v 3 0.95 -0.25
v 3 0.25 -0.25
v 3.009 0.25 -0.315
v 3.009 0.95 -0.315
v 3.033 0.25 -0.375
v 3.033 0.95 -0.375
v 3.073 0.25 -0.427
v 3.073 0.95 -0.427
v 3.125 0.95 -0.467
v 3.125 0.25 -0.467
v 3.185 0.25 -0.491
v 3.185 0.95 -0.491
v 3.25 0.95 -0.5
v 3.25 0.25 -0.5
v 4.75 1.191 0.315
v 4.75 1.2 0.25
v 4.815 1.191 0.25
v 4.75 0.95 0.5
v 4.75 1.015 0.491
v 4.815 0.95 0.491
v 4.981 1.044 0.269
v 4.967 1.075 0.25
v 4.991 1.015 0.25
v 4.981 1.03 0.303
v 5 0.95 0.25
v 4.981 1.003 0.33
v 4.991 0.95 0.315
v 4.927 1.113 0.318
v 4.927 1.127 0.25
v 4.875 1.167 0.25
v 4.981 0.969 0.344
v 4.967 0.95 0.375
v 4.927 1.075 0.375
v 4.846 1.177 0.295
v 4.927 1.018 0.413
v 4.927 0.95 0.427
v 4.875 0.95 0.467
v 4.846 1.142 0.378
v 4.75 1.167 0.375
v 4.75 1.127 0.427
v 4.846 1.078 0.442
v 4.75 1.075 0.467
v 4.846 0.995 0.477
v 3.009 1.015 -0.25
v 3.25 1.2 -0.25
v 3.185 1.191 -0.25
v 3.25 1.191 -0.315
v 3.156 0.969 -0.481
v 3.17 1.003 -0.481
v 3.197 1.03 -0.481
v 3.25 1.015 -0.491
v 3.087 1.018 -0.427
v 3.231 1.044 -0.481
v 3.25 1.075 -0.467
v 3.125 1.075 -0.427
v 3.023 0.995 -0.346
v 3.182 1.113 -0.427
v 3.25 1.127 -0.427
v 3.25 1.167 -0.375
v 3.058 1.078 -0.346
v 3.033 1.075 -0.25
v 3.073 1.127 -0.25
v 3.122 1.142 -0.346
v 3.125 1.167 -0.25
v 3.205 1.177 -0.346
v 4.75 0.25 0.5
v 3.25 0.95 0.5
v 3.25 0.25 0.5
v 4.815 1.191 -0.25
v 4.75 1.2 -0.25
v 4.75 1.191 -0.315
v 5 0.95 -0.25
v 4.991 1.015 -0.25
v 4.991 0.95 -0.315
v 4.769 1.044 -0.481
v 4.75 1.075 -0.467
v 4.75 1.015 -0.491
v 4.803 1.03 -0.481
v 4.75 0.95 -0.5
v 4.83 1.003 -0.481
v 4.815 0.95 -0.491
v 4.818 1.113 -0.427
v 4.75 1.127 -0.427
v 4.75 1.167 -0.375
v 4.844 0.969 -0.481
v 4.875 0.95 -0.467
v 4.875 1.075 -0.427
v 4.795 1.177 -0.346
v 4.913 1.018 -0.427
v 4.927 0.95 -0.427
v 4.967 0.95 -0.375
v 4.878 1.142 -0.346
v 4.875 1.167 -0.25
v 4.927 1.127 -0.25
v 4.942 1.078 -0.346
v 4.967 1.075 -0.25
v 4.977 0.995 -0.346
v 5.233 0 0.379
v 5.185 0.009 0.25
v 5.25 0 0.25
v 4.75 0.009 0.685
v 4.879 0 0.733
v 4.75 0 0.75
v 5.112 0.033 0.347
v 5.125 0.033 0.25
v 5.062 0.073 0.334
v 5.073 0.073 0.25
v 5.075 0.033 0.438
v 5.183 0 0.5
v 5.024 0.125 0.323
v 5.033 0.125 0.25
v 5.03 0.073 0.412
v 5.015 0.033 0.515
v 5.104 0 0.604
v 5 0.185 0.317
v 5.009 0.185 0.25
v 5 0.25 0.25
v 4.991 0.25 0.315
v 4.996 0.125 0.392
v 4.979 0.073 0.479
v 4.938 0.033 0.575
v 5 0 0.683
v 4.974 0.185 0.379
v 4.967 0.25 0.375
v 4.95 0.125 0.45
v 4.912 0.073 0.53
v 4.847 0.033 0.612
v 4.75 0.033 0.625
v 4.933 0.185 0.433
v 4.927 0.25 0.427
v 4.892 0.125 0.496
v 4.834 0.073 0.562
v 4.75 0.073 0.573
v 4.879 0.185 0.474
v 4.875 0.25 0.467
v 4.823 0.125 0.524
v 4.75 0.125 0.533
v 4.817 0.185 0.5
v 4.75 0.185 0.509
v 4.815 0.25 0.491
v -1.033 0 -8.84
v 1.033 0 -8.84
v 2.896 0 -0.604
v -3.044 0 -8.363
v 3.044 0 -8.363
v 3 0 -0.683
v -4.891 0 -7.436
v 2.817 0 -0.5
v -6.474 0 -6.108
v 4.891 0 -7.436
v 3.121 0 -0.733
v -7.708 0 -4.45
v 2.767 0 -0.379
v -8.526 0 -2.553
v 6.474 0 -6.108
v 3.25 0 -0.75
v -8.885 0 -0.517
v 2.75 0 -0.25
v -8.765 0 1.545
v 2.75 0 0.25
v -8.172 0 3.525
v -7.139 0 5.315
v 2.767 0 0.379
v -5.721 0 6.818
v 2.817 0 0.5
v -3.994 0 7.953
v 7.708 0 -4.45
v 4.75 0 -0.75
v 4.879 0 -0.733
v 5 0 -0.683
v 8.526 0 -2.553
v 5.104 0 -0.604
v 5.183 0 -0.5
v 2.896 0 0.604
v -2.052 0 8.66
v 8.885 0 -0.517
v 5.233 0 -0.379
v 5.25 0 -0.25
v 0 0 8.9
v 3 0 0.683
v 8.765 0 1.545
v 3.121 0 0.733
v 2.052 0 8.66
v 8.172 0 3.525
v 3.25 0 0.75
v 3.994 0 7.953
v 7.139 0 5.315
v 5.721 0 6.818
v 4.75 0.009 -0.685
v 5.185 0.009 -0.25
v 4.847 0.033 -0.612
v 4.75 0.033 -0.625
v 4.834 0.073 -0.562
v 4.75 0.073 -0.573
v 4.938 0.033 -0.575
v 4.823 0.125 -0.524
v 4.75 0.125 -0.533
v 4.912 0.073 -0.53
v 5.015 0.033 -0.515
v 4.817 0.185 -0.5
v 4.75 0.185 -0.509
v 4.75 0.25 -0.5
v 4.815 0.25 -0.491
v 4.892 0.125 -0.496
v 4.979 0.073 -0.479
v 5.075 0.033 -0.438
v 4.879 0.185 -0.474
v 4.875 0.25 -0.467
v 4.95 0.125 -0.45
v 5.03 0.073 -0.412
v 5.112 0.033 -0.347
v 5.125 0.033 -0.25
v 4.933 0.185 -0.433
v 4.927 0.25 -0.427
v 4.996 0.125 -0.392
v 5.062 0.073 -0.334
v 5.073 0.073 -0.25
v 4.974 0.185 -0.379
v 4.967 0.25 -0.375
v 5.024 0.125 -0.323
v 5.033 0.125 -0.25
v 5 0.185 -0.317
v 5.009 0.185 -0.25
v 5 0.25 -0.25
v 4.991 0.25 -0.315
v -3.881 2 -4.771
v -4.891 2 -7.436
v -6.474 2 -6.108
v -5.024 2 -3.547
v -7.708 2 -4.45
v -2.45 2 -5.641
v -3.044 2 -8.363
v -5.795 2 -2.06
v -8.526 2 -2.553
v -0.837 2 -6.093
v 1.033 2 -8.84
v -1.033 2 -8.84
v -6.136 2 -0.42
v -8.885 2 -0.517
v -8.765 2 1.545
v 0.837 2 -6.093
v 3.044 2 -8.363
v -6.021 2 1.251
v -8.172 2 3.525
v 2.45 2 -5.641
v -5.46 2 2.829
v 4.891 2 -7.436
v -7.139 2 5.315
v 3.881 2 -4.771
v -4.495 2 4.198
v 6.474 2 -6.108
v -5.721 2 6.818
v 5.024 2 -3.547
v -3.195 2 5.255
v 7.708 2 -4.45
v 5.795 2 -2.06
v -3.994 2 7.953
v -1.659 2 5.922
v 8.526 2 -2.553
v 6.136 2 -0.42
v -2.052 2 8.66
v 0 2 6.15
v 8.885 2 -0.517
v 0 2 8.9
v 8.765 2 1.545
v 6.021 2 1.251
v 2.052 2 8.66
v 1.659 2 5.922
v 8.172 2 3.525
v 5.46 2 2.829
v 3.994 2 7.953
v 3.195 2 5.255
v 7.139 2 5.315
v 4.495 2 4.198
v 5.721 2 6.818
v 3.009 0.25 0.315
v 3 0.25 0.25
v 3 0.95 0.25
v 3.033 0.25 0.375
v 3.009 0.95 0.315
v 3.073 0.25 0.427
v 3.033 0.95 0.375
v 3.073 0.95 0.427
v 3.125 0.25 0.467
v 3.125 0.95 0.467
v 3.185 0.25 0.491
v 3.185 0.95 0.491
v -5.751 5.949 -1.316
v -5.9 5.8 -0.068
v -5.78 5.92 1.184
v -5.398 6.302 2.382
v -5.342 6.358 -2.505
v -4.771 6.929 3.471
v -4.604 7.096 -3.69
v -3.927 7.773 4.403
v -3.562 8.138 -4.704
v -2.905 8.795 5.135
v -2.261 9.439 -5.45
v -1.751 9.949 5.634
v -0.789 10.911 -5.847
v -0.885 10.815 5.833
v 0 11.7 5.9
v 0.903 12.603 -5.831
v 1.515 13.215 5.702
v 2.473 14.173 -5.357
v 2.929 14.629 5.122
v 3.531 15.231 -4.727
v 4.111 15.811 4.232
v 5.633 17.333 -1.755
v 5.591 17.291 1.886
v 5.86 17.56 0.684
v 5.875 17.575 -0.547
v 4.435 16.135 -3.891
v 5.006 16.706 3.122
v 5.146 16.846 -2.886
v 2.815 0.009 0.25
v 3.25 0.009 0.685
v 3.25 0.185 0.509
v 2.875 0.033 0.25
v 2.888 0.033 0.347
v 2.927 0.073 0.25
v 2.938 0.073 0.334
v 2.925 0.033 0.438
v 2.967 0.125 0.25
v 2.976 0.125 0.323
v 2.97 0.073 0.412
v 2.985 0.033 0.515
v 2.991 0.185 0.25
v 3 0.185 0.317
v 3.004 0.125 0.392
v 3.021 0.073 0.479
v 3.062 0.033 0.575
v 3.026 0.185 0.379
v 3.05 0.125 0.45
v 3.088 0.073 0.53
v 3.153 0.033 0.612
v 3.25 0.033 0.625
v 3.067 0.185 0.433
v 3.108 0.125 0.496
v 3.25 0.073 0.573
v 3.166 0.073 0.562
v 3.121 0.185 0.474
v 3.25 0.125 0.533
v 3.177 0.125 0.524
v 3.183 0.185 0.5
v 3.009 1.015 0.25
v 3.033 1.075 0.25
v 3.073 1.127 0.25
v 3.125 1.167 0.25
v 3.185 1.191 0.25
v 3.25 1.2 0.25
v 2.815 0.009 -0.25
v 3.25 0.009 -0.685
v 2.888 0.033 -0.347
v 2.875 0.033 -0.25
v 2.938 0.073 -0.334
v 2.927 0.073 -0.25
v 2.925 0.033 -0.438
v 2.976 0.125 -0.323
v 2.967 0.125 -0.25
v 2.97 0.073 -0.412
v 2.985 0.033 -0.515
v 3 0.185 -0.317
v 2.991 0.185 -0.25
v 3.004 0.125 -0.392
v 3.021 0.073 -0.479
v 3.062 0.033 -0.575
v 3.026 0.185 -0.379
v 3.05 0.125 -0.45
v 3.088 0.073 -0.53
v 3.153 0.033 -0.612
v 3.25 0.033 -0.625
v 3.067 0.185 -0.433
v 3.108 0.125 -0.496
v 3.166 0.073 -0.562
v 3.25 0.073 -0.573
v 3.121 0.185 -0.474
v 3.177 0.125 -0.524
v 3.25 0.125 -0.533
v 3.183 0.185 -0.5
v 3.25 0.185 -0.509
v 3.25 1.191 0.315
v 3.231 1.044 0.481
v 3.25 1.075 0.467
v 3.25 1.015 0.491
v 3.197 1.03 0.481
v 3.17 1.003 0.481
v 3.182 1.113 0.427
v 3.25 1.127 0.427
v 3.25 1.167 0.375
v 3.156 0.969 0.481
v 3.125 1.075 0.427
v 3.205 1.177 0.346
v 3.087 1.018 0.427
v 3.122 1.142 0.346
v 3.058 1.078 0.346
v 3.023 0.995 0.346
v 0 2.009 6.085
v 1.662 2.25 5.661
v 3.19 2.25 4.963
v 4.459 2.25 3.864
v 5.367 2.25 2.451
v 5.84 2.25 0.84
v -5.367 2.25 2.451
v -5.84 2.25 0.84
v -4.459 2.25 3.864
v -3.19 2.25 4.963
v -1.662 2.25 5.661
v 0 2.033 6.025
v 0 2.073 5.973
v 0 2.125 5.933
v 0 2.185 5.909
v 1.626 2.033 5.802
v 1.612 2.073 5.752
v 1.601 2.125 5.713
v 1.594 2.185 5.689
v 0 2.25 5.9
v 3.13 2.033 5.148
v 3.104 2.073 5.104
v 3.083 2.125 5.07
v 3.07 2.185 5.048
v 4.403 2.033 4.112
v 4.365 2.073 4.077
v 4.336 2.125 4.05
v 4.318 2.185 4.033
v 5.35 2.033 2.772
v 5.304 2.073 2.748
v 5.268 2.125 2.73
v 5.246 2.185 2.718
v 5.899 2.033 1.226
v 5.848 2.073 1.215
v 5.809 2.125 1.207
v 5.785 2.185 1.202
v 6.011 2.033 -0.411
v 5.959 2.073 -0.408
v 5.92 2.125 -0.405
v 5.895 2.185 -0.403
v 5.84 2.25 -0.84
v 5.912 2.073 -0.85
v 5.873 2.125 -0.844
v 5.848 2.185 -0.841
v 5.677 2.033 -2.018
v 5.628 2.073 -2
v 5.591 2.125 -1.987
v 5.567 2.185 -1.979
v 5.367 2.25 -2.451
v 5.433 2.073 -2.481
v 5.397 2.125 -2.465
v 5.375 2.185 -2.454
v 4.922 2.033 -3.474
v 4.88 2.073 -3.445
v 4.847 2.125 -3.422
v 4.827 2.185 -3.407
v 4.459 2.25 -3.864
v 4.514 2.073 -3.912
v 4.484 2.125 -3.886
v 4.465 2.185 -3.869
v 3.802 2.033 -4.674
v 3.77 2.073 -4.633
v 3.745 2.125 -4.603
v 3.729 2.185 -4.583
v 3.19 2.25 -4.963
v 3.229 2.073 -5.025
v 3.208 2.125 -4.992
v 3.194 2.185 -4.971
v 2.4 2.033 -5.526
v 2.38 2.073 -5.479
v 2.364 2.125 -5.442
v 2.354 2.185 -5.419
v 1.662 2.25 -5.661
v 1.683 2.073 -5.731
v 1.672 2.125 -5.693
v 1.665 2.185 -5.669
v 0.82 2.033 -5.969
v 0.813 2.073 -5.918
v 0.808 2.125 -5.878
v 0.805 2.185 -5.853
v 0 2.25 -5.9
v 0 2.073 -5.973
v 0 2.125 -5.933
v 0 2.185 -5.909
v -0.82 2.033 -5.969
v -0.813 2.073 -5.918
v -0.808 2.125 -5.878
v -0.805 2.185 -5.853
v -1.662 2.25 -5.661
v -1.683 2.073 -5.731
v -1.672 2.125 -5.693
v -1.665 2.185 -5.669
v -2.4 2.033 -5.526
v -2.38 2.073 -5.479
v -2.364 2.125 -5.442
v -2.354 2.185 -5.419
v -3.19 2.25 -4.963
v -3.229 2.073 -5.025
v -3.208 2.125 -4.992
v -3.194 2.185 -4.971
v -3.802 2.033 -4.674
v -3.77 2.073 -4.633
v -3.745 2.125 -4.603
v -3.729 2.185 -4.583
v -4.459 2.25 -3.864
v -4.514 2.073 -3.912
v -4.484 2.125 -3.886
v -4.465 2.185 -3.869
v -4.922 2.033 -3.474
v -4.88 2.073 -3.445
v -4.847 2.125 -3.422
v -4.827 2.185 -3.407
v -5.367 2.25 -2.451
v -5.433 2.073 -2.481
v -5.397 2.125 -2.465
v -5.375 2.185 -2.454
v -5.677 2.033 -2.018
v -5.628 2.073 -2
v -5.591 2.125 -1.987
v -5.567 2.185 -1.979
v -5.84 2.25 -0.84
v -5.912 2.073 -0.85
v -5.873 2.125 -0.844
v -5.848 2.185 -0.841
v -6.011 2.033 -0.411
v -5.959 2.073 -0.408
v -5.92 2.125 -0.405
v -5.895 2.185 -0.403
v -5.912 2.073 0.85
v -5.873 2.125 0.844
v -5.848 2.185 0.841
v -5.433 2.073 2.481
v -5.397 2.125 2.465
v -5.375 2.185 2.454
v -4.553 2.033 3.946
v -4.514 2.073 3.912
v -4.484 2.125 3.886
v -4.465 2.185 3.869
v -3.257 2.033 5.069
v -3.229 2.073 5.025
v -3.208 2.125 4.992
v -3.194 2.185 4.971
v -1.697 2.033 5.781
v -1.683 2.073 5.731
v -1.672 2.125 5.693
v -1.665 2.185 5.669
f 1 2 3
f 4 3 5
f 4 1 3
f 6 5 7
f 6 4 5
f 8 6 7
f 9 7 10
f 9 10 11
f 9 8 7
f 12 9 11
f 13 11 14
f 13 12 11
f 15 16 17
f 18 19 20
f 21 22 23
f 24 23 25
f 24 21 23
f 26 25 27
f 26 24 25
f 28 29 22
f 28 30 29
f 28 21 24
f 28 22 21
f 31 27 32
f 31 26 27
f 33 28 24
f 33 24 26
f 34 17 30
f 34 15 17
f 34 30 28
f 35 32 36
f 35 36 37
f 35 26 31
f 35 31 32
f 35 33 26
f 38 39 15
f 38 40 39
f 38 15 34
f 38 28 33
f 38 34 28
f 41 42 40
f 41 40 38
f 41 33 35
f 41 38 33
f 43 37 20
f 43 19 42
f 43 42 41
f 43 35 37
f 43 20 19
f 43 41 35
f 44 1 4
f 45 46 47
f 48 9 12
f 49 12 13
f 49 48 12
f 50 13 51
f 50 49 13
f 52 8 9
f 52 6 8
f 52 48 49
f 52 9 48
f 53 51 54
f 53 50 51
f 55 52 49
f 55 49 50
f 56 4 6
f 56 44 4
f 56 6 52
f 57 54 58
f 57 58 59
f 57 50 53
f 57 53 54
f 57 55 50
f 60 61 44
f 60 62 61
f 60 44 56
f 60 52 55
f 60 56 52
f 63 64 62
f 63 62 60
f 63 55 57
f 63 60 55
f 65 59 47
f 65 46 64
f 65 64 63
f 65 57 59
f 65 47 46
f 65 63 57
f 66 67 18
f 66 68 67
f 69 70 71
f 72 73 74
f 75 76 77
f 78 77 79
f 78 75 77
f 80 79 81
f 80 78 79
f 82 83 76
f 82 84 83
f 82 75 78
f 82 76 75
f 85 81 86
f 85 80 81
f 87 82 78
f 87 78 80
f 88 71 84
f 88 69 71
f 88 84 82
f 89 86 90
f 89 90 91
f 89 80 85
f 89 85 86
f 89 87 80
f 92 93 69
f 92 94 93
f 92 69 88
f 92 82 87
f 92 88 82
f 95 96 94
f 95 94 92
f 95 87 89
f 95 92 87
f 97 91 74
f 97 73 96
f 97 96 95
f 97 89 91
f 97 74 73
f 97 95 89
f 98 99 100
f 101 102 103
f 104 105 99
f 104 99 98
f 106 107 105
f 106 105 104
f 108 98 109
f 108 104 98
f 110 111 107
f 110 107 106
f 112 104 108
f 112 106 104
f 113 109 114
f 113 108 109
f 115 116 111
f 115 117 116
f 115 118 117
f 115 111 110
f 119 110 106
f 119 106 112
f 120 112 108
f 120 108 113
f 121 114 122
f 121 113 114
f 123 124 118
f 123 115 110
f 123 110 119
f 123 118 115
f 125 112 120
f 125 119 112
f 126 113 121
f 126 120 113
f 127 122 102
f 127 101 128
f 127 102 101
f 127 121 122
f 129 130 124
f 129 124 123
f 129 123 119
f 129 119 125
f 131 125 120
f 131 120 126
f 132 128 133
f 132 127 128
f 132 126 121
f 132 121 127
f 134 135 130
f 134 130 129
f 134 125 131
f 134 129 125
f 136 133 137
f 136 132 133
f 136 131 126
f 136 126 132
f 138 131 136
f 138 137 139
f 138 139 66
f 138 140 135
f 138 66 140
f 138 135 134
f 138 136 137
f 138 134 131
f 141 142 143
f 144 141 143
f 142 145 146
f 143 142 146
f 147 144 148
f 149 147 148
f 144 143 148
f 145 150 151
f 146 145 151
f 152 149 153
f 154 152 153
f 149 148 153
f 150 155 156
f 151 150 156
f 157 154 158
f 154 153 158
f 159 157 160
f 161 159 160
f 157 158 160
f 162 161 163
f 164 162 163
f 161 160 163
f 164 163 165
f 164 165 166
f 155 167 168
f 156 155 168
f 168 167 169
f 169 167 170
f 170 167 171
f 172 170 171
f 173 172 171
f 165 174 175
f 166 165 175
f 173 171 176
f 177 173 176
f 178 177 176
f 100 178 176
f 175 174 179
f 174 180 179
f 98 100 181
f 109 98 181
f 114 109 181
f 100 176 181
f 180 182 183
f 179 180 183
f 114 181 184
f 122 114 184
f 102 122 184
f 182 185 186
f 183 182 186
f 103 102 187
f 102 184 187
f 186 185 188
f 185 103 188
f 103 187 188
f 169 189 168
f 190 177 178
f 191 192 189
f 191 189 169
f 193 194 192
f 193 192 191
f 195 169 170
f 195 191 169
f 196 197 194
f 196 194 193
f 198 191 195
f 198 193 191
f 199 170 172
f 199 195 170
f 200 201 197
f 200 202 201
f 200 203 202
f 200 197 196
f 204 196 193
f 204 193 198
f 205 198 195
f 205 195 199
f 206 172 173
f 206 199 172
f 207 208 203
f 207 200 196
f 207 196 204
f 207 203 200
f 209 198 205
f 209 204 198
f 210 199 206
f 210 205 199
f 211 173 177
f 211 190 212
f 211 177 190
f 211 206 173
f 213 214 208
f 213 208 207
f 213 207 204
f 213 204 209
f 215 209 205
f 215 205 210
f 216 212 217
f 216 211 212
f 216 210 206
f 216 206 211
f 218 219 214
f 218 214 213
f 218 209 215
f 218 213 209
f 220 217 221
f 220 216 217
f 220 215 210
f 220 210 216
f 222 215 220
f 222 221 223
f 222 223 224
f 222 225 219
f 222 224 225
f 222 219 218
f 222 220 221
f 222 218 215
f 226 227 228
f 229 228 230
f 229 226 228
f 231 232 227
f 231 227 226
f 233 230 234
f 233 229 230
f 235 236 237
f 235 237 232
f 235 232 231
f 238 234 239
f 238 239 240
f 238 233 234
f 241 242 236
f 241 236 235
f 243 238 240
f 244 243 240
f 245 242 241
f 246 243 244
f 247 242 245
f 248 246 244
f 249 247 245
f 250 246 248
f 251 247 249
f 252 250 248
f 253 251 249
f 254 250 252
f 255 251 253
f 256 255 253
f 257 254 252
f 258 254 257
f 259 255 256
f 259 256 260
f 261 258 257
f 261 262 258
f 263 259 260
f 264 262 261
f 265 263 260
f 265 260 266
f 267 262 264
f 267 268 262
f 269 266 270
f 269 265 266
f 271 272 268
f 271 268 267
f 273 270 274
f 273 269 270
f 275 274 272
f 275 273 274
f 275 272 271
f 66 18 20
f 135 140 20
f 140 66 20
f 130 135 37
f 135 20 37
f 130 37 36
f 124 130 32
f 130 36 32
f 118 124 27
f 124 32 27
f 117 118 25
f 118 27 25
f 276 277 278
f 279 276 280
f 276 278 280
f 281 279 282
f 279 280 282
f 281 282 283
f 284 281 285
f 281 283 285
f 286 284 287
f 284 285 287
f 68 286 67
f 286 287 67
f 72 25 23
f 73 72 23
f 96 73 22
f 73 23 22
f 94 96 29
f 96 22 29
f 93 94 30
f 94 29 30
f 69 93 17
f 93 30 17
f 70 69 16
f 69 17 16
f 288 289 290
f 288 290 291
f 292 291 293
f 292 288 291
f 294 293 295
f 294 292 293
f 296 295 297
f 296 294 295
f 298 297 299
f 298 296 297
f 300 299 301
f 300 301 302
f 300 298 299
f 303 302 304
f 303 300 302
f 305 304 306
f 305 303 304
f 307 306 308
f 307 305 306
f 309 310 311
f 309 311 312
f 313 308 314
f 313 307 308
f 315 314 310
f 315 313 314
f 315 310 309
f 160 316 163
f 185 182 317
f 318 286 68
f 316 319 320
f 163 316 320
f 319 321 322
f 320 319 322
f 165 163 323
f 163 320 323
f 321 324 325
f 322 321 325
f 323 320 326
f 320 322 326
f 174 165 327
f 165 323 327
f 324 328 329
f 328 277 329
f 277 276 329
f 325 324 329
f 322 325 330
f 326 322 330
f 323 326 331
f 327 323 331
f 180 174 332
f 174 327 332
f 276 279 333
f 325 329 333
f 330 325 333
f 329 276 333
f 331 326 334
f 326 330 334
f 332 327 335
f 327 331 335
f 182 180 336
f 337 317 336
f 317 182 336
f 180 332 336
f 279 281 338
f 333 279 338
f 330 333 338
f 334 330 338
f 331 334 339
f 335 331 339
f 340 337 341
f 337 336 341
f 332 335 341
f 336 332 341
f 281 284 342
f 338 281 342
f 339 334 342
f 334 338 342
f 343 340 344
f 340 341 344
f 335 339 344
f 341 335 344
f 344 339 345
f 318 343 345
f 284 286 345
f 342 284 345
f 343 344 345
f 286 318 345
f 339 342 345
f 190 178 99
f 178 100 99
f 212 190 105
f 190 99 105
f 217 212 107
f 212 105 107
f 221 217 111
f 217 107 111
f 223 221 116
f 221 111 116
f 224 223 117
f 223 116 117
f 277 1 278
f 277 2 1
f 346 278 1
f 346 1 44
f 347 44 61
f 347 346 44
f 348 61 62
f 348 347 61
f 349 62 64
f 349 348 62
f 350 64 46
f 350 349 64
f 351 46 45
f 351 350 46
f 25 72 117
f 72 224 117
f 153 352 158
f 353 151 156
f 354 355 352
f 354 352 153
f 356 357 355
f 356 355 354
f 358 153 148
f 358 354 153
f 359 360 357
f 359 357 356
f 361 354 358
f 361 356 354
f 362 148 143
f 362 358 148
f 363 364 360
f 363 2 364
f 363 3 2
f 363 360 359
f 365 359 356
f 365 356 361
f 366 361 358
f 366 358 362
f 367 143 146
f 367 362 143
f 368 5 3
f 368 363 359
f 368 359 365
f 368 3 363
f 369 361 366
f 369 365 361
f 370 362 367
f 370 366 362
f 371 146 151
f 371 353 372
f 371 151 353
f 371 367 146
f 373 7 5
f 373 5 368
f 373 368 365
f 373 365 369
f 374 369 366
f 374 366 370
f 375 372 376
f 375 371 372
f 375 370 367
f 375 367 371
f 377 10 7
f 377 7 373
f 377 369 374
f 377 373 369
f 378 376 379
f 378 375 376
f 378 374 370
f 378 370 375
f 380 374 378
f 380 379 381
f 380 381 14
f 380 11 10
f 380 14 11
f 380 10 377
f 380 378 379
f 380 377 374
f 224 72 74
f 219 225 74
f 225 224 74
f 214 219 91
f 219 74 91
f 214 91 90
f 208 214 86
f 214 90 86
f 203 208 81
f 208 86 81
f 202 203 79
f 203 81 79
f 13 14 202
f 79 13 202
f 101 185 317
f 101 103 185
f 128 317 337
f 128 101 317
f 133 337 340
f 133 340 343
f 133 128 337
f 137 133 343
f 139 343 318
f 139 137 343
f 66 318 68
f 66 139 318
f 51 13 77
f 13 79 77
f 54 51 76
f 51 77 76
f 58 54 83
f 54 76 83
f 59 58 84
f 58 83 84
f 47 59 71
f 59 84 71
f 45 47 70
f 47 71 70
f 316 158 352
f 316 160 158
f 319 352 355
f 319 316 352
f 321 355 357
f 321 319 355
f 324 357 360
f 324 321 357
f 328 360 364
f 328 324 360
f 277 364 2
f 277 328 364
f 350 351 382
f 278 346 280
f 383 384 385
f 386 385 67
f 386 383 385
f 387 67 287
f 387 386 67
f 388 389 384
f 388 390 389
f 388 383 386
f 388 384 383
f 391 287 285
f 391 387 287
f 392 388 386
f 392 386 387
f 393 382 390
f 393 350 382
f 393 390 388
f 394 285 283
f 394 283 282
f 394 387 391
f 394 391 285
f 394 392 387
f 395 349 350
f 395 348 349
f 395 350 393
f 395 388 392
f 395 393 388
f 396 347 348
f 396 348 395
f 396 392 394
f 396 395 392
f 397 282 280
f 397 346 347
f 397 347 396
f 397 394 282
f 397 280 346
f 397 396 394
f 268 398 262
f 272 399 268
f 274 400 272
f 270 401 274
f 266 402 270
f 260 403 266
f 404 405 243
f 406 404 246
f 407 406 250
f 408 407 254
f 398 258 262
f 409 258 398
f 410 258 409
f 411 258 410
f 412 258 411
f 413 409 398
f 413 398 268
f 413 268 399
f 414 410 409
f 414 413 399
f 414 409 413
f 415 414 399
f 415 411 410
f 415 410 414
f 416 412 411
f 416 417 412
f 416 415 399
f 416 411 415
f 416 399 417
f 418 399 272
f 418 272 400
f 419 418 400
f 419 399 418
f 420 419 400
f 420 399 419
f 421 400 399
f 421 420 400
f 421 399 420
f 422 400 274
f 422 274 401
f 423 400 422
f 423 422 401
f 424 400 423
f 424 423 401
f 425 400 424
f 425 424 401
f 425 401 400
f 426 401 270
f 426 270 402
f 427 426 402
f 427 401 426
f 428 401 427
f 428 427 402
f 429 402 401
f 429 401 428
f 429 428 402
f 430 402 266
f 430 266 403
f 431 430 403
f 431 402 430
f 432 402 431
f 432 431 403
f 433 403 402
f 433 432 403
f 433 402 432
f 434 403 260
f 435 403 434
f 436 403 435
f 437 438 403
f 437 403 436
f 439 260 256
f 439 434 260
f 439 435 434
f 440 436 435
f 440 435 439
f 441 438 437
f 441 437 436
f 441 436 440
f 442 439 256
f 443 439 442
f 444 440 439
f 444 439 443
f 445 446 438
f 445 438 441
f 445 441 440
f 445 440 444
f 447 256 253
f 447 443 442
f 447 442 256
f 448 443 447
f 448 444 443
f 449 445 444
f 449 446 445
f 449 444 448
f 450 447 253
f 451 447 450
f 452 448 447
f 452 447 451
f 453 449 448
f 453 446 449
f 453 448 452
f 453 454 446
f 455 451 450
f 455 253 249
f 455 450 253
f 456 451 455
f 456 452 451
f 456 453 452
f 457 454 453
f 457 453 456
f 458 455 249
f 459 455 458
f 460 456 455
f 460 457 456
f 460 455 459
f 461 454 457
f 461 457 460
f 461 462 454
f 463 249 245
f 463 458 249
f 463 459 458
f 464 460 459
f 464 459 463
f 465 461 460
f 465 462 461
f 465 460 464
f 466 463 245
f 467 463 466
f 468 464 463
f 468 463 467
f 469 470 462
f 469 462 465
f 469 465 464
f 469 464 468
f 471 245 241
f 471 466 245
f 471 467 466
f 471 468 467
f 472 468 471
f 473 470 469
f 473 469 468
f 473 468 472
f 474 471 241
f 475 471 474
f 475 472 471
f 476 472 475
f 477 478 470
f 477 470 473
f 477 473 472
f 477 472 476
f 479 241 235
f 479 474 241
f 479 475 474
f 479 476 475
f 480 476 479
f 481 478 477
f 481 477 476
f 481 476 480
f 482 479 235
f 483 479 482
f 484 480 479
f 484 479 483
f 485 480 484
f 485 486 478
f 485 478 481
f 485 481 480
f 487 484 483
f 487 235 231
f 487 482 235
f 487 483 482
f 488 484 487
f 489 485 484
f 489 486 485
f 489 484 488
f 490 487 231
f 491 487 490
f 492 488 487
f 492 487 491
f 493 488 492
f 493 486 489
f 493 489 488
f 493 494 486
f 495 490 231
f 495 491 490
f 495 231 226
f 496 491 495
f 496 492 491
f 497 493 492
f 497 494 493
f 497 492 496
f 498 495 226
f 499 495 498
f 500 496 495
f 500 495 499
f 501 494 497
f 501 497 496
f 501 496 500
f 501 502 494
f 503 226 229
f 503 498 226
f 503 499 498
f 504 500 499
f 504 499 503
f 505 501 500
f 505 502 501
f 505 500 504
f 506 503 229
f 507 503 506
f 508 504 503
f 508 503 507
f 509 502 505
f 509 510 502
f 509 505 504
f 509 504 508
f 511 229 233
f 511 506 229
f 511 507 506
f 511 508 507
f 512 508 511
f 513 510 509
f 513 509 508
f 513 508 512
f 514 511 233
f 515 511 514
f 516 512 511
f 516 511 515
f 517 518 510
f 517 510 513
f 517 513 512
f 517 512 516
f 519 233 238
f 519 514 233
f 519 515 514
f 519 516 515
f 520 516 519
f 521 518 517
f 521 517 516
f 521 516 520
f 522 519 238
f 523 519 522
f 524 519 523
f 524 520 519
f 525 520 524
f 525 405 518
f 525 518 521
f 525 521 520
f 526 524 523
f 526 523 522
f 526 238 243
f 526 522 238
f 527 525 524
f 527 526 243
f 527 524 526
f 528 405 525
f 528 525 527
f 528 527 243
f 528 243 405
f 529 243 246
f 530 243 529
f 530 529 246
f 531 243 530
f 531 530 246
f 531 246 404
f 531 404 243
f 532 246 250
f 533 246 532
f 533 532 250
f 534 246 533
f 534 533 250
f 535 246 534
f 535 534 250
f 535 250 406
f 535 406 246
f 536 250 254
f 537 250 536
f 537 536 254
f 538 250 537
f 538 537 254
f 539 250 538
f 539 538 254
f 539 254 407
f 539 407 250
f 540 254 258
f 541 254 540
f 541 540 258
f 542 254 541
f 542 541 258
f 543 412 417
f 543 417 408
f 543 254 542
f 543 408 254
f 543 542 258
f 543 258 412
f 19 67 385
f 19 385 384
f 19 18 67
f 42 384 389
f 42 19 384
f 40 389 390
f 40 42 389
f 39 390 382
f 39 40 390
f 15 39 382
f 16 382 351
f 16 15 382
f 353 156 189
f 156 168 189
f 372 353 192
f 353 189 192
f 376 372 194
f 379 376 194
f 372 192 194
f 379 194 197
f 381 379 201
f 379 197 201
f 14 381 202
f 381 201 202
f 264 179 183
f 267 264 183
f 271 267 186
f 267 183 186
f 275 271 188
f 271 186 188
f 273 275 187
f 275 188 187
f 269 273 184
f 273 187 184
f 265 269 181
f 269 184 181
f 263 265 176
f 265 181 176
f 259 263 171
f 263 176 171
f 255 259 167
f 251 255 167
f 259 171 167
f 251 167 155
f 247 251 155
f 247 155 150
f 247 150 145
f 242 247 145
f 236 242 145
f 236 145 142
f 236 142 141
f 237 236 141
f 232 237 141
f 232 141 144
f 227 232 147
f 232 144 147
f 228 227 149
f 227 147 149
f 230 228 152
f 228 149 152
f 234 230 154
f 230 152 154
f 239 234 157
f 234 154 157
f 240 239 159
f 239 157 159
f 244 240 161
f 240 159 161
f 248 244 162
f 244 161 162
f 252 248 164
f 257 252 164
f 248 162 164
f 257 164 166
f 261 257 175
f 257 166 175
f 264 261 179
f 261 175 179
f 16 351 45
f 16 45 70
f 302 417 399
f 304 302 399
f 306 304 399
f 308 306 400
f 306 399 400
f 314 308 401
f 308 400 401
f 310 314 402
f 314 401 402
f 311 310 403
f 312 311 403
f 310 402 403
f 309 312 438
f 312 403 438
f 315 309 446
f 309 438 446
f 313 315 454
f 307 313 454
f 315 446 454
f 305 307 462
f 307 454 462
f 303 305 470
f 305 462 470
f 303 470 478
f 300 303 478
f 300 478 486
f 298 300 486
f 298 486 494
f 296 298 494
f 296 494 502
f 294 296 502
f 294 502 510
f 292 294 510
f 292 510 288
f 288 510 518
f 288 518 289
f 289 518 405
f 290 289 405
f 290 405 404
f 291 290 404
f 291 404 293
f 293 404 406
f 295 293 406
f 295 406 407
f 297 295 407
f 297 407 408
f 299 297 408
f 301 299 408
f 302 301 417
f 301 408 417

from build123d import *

# Parameters (mm, degrees)
SKETCH1_R               = 8.9
BOSS_EXTRUDE1_DEPTH     = 2
SKETCH2_R               = 5.9
BOSS_EXTRUDE2_DEPTH     = 20
CUT_EXTRUDE1_DEPTH      = 26.346005602
CUT_EXTRUDE1_DEPTH_BACK = 26.346005602
SKETCH4_W               = 2
SKETCH4_H               = 1
CUT_EXTRUDE2_DEPTH      = 1.2
FILLET1_R               = 0.25
FILLET2_R               = 0.25


with BuildPart() as part:
    # Sketch1 → Boss-Extrude1 (new body)
    with BuildSketch(Plane(origin=(0, 0, 0), x_dir=(1, 0, 0), z_dir=(0, 1, 0))):
        with Locations(Location((0, 0, 0), (0, 0, 270))):
            Circle(SKETCH1_R)
    extrude(amount=BOSS_EXTRUDE1_DEPTH)

    # Sketch2 → Boss-Extrude2 (add)
    with BuildSketch(Plane(origin=(0, 2, 0), x_dir=(1, 0, 0), z_dir=(0, 1, 0))):
        with Locations(Location((0, 0, 0), (0, 0, 270))):
            Circle(SKETCH2_R)
    extrude(amount=BOSS_EXTRUDE2_DEPTH)

    # Sketch3 → Cut-Extrude1 (cut, two sides: drawn at the far end of the back side and taken through both)
    with BuildSketch(Plane.XY.offset(-CUT_EXTRUDE1_DEPTH_BACK)):
        Polygon((-6.28, 5.42), (6.28, 17.98), (6.28, 28.771900514), (-6.28, 28.771900514), align=None)
    extrude(amount=CUT_EXTRUDE1_DEPTH + CUT_EXTRUDE1_DEPTH_BACK, mode=Mode.SUBTRACT)

    # Sketch4 → Cut-Extrude2 (cut)
    with BuildSketch(Plane.XZ):
        with Locations((4, 0)):
            Rectangle(SKETCH4_W, SKETCH4_H)
    extrude(amount=-CUT_EXTRUDE2_DEPTH, mode=Mode.SUBTRACT)

    # Fillet1
    fillet1_edges = [part.edges().sort_by_distance(p)[0] for p in [
        (3, 1.2, 0),
        (3, 0.6, -0.5),
        (4, 1.2, 0.5),
        (3, 0.6, 0.5),
        (5, 1.2, 0),
        (5, 0.6, 0.5),
        (4, 1.2, -0.5),
        (5, 0.6, -0.5),
        (3, 0, 0),
        (4, 0, -0.5),
        (5, 0, 0),
        (4, 0, 0.5),
    ]]
    fillet(fillet1_edges, radius=FILLET1_R)

    # Fillet2
    fillet2_edges = [part.edges().sort_by_distance(p)[0] for p in [
        (0, 2, -5.9),
    ]]
    fillet(fillet2_edges, radius=FILLET2_R)


solid = part.part
